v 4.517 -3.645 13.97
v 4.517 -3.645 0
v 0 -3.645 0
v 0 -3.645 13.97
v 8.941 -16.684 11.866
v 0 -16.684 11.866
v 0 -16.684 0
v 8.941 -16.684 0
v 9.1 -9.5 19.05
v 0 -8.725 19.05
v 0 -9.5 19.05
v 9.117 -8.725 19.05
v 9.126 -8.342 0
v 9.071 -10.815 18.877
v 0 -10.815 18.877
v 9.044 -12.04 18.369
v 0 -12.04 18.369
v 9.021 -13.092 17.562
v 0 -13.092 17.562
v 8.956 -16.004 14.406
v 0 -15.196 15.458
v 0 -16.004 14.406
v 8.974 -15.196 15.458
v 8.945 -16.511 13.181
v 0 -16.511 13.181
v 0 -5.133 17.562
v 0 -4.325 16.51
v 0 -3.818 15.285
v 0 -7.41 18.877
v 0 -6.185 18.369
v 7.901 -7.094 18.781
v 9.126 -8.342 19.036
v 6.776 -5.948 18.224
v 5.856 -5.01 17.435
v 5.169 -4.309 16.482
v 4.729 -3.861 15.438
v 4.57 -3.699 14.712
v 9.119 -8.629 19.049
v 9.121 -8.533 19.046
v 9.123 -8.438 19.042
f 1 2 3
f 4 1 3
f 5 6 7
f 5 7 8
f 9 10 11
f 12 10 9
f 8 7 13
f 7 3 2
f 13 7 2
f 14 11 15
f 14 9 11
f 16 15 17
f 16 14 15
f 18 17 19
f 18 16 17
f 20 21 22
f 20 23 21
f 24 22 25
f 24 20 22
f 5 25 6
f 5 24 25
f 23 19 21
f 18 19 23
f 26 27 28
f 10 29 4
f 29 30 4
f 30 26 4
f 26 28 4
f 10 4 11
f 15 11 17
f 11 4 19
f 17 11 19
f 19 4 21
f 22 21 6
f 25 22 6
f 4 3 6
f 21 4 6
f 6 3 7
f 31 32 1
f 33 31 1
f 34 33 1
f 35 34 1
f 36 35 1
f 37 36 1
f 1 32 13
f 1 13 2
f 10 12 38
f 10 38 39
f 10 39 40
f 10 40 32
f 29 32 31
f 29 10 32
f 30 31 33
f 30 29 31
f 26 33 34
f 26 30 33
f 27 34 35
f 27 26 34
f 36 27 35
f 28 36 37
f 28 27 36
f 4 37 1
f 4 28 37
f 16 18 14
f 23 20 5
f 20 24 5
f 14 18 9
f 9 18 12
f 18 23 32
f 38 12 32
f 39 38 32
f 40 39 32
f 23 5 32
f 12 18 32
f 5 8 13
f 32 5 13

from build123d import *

# Parameters (mm, degrees)
F1_DEPTH = 19.05
F2_DEPTH = 12.7
F3_SIZE  = 5.08
F4_R     = 5.08


with BuildPart() as f1:
    # F0 (on Top) → F1 (new body)
    with BuildSketch(Plane.XY):
        Polygon((1.9531995618, -3.6446304457), (0, -3.6446304457), (0, -16.6841130704), (8.9412089437, -16.6841130704), (9.1255623847, -8.3420565352), (4.5166932978, -3.6446304457), align=None)
    extrude(amount=F1_DEPTH)

    # F0 (on Top) → F2 (join)
    with BuildSketch(Plane.XY):
        Polygon((1.9531995618, -3.6446304457), (0, -3.6446304457), (0, -16.6841130704), (8.9412089437, -16.6841130704), (9.1255623847, -8.3420565352), (4.5166932978, -3.6446304457), align=None)
    extrude(amount=F2_DEPTH)

    # F3
    f3_edges = [f1.edges().sort_by_distance(p)[0] for p in [
        (4.470604, -16.684113, 19.05),
    ]]
    chamfer(f3_edges, length=F3_SIZE)

    # F4
    f4_edges = [f1.edges().sort_by_distance(p)[0] for p in [
        (4.526737, -11.604113, 19.05),
        (4.470604, -16.684113, 13.97),
        (2.258347, -3.64463, 19.05),
    ]]
    fillet(f4_edges, radius=F4_R)


solid = f1.part
